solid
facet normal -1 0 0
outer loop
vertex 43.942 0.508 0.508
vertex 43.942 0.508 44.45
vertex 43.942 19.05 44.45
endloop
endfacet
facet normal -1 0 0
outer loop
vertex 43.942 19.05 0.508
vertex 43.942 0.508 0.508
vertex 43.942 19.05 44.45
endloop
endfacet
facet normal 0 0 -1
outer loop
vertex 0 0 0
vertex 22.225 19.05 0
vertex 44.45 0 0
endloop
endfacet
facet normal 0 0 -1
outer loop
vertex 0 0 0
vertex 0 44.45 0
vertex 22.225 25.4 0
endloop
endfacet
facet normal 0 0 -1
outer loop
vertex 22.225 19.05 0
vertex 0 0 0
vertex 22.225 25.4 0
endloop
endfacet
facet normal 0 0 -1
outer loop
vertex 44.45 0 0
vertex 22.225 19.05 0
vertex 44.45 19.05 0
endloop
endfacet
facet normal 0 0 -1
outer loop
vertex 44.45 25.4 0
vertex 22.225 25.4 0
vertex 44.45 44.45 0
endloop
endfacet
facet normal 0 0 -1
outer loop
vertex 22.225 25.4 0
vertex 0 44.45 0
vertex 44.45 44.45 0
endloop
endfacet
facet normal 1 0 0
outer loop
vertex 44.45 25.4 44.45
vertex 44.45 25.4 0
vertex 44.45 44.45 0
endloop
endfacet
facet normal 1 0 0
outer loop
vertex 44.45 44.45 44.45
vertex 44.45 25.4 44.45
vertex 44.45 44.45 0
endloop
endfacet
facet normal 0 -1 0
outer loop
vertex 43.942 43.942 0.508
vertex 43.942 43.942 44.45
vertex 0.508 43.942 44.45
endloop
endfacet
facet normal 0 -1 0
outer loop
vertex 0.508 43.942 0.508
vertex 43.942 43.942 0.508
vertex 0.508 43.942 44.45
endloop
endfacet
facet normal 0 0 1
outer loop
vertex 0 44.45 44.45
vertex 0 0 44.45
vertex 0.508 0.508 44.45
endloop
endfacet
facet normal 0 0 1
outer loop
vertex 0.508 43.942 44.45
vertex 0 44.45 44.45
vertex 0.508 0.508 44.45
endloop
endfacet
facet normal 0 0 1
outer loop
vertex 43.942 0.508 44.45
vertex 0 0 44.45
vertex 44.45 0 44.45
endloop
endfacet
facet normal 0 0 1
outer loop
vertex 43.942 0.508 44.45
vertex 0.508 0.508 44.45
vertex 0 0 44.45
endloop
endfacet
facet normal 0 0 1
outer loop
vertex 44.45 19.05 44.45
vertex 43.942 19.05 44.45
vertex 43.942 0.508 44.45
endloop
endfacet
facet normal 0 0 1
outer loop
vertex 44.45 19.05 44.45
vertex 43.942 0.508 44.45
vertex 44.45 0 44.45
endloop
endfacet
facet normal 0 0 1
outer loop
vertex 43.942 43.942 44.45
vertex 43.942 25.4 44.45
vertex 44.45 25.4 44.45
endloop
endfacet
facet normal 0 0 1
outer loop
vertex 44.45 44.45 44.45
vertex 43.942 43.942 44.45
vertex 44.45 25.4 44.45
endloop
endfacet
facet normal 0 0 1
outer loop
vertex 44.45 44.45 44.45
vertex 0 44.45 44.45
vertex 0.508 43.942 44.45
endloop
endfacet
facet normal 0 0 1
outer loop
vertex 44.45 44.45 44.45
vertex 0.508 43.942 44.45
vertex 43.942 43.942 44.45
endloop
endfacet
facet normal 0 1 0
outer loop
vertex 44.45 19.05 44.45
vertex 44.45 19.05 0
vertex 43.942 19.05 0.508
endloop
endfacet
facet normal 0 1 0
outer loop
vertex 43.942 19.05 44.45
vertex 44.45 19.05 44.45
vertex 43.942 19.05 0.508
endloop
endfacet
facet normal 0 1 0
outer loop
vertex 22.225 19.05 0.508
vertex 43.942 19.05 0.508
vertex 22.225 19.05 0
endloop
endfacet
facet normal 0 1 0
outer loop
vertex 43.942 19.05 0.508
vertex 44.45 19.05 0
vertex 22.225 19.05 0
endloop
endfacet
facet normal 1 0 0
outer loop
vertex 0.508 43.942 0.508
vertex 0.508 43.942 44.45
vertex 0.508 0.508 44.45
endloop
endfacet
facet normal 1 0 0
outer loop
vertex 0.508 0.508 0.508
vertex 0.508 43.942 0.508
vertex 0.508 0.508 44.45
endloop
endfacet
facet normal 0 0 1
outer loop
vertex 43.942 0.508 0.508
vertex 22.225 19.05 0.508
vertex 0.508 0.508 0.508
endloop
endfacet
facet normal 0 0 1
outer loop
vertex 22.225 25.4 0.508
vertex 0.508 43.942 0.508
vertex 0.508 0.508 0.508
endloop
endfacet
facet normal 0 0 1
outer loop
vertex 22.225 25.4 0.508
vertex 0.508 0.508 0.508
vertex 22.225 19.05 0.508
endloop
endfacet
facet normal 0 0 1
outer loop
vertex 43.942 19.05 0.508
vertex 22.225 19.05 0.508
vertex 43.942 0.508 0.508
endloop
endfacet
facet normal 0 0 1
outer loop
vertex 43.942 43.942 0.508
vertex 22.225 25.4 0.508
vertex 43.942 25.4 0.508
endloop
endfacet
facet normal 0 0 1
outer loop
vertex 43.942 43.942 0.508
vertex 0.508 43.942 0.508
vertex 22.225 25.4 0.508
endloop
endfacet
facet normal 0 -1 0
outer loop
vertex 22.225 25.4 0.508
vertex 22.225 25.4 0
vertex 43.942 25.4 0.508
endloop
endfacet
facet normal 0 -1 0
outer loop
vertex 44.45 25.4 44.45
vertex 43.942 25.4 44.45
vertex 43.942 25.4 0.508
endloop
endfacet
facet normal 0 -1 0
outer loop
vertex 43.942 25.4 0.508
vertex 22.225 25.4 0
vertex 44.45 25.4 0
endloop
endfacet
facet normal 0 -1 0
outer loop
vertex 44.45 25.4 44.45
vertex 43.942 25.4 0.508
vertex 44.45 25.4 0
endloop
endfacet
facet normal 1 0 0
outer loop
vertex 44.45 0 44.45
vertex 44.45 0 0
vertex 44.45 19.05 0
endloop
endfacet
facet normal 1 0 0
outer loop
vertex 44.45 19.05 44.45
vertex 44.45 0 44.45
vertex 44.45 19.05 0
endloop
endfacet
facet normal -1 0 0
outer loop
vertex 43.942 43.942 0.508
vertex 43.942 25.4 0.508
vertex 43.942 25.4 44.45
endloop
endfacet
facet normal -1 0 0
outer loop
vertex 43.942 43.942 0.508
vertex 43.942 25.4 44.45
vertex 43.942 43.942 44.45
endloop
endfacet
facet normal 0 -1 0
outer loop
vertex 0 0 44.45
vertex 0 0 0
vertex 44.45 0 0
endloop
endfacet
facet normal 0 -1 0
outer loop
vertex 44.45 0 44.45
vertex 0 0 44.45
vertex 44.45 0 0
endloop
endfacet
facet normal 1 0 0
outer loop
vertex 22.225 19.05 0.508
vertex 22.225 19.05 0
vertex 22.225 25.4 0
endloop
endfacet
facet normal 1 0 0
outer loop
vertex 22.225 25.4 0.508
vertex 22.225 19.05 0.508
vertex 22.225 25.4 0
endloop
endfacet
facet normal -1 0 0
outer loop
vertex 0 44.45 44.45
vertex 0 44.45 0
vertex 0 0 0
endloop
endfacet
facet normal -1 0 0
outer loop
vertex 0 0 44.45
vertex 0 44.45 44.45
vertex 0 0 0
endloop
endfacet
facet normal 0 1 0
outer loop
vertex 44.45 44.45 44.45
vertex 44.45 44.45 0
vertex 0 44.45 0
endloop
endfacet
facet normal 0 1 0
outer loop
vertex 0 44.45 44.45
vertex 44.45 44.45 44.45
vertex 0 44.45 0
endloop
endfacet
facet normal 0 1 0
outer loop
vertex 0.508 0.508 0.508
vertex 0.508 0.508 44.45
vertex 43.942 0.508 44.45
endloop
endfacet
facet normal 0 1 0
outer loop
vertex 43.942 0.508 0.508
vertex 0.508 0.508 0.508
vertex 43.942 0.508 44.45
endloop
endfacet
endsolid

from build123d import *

# Parameters (mm, degrees)
F1_DEPTH = 44.45
F2_T     = -0.508


# Not quite as in the source:
# - the program builds the solid bodies; features that only make, move or delete a surface that nothing else refers to are left out


with BuildPart() as f1:
    # F0 (on Top) → F1 (new body)
    with BuildSketch(Plane.XY):
        Polygon((0, 44.45), (0, 0), (44.45, 0), (44.45, 19.05), (22.225, 19.05), (22.225, 25.4), (44.45, 25.4), (44.45, 44.45), align=None)
    extrude(amount=F1_DEPTH)

    # F2
    f2_openings = [f1.faces().sort_by_distance(p)[0] for p in [
        (21.370192, 22.225, 44.45),
        (22.225, 22.225, 22.225),
        (33.3375, 25.4, 22.225),
        (33.3375, 19.05, 22.225),
    ]]
    offset(amount=F2_T, openings=f2_openings)


solid = f1.part
